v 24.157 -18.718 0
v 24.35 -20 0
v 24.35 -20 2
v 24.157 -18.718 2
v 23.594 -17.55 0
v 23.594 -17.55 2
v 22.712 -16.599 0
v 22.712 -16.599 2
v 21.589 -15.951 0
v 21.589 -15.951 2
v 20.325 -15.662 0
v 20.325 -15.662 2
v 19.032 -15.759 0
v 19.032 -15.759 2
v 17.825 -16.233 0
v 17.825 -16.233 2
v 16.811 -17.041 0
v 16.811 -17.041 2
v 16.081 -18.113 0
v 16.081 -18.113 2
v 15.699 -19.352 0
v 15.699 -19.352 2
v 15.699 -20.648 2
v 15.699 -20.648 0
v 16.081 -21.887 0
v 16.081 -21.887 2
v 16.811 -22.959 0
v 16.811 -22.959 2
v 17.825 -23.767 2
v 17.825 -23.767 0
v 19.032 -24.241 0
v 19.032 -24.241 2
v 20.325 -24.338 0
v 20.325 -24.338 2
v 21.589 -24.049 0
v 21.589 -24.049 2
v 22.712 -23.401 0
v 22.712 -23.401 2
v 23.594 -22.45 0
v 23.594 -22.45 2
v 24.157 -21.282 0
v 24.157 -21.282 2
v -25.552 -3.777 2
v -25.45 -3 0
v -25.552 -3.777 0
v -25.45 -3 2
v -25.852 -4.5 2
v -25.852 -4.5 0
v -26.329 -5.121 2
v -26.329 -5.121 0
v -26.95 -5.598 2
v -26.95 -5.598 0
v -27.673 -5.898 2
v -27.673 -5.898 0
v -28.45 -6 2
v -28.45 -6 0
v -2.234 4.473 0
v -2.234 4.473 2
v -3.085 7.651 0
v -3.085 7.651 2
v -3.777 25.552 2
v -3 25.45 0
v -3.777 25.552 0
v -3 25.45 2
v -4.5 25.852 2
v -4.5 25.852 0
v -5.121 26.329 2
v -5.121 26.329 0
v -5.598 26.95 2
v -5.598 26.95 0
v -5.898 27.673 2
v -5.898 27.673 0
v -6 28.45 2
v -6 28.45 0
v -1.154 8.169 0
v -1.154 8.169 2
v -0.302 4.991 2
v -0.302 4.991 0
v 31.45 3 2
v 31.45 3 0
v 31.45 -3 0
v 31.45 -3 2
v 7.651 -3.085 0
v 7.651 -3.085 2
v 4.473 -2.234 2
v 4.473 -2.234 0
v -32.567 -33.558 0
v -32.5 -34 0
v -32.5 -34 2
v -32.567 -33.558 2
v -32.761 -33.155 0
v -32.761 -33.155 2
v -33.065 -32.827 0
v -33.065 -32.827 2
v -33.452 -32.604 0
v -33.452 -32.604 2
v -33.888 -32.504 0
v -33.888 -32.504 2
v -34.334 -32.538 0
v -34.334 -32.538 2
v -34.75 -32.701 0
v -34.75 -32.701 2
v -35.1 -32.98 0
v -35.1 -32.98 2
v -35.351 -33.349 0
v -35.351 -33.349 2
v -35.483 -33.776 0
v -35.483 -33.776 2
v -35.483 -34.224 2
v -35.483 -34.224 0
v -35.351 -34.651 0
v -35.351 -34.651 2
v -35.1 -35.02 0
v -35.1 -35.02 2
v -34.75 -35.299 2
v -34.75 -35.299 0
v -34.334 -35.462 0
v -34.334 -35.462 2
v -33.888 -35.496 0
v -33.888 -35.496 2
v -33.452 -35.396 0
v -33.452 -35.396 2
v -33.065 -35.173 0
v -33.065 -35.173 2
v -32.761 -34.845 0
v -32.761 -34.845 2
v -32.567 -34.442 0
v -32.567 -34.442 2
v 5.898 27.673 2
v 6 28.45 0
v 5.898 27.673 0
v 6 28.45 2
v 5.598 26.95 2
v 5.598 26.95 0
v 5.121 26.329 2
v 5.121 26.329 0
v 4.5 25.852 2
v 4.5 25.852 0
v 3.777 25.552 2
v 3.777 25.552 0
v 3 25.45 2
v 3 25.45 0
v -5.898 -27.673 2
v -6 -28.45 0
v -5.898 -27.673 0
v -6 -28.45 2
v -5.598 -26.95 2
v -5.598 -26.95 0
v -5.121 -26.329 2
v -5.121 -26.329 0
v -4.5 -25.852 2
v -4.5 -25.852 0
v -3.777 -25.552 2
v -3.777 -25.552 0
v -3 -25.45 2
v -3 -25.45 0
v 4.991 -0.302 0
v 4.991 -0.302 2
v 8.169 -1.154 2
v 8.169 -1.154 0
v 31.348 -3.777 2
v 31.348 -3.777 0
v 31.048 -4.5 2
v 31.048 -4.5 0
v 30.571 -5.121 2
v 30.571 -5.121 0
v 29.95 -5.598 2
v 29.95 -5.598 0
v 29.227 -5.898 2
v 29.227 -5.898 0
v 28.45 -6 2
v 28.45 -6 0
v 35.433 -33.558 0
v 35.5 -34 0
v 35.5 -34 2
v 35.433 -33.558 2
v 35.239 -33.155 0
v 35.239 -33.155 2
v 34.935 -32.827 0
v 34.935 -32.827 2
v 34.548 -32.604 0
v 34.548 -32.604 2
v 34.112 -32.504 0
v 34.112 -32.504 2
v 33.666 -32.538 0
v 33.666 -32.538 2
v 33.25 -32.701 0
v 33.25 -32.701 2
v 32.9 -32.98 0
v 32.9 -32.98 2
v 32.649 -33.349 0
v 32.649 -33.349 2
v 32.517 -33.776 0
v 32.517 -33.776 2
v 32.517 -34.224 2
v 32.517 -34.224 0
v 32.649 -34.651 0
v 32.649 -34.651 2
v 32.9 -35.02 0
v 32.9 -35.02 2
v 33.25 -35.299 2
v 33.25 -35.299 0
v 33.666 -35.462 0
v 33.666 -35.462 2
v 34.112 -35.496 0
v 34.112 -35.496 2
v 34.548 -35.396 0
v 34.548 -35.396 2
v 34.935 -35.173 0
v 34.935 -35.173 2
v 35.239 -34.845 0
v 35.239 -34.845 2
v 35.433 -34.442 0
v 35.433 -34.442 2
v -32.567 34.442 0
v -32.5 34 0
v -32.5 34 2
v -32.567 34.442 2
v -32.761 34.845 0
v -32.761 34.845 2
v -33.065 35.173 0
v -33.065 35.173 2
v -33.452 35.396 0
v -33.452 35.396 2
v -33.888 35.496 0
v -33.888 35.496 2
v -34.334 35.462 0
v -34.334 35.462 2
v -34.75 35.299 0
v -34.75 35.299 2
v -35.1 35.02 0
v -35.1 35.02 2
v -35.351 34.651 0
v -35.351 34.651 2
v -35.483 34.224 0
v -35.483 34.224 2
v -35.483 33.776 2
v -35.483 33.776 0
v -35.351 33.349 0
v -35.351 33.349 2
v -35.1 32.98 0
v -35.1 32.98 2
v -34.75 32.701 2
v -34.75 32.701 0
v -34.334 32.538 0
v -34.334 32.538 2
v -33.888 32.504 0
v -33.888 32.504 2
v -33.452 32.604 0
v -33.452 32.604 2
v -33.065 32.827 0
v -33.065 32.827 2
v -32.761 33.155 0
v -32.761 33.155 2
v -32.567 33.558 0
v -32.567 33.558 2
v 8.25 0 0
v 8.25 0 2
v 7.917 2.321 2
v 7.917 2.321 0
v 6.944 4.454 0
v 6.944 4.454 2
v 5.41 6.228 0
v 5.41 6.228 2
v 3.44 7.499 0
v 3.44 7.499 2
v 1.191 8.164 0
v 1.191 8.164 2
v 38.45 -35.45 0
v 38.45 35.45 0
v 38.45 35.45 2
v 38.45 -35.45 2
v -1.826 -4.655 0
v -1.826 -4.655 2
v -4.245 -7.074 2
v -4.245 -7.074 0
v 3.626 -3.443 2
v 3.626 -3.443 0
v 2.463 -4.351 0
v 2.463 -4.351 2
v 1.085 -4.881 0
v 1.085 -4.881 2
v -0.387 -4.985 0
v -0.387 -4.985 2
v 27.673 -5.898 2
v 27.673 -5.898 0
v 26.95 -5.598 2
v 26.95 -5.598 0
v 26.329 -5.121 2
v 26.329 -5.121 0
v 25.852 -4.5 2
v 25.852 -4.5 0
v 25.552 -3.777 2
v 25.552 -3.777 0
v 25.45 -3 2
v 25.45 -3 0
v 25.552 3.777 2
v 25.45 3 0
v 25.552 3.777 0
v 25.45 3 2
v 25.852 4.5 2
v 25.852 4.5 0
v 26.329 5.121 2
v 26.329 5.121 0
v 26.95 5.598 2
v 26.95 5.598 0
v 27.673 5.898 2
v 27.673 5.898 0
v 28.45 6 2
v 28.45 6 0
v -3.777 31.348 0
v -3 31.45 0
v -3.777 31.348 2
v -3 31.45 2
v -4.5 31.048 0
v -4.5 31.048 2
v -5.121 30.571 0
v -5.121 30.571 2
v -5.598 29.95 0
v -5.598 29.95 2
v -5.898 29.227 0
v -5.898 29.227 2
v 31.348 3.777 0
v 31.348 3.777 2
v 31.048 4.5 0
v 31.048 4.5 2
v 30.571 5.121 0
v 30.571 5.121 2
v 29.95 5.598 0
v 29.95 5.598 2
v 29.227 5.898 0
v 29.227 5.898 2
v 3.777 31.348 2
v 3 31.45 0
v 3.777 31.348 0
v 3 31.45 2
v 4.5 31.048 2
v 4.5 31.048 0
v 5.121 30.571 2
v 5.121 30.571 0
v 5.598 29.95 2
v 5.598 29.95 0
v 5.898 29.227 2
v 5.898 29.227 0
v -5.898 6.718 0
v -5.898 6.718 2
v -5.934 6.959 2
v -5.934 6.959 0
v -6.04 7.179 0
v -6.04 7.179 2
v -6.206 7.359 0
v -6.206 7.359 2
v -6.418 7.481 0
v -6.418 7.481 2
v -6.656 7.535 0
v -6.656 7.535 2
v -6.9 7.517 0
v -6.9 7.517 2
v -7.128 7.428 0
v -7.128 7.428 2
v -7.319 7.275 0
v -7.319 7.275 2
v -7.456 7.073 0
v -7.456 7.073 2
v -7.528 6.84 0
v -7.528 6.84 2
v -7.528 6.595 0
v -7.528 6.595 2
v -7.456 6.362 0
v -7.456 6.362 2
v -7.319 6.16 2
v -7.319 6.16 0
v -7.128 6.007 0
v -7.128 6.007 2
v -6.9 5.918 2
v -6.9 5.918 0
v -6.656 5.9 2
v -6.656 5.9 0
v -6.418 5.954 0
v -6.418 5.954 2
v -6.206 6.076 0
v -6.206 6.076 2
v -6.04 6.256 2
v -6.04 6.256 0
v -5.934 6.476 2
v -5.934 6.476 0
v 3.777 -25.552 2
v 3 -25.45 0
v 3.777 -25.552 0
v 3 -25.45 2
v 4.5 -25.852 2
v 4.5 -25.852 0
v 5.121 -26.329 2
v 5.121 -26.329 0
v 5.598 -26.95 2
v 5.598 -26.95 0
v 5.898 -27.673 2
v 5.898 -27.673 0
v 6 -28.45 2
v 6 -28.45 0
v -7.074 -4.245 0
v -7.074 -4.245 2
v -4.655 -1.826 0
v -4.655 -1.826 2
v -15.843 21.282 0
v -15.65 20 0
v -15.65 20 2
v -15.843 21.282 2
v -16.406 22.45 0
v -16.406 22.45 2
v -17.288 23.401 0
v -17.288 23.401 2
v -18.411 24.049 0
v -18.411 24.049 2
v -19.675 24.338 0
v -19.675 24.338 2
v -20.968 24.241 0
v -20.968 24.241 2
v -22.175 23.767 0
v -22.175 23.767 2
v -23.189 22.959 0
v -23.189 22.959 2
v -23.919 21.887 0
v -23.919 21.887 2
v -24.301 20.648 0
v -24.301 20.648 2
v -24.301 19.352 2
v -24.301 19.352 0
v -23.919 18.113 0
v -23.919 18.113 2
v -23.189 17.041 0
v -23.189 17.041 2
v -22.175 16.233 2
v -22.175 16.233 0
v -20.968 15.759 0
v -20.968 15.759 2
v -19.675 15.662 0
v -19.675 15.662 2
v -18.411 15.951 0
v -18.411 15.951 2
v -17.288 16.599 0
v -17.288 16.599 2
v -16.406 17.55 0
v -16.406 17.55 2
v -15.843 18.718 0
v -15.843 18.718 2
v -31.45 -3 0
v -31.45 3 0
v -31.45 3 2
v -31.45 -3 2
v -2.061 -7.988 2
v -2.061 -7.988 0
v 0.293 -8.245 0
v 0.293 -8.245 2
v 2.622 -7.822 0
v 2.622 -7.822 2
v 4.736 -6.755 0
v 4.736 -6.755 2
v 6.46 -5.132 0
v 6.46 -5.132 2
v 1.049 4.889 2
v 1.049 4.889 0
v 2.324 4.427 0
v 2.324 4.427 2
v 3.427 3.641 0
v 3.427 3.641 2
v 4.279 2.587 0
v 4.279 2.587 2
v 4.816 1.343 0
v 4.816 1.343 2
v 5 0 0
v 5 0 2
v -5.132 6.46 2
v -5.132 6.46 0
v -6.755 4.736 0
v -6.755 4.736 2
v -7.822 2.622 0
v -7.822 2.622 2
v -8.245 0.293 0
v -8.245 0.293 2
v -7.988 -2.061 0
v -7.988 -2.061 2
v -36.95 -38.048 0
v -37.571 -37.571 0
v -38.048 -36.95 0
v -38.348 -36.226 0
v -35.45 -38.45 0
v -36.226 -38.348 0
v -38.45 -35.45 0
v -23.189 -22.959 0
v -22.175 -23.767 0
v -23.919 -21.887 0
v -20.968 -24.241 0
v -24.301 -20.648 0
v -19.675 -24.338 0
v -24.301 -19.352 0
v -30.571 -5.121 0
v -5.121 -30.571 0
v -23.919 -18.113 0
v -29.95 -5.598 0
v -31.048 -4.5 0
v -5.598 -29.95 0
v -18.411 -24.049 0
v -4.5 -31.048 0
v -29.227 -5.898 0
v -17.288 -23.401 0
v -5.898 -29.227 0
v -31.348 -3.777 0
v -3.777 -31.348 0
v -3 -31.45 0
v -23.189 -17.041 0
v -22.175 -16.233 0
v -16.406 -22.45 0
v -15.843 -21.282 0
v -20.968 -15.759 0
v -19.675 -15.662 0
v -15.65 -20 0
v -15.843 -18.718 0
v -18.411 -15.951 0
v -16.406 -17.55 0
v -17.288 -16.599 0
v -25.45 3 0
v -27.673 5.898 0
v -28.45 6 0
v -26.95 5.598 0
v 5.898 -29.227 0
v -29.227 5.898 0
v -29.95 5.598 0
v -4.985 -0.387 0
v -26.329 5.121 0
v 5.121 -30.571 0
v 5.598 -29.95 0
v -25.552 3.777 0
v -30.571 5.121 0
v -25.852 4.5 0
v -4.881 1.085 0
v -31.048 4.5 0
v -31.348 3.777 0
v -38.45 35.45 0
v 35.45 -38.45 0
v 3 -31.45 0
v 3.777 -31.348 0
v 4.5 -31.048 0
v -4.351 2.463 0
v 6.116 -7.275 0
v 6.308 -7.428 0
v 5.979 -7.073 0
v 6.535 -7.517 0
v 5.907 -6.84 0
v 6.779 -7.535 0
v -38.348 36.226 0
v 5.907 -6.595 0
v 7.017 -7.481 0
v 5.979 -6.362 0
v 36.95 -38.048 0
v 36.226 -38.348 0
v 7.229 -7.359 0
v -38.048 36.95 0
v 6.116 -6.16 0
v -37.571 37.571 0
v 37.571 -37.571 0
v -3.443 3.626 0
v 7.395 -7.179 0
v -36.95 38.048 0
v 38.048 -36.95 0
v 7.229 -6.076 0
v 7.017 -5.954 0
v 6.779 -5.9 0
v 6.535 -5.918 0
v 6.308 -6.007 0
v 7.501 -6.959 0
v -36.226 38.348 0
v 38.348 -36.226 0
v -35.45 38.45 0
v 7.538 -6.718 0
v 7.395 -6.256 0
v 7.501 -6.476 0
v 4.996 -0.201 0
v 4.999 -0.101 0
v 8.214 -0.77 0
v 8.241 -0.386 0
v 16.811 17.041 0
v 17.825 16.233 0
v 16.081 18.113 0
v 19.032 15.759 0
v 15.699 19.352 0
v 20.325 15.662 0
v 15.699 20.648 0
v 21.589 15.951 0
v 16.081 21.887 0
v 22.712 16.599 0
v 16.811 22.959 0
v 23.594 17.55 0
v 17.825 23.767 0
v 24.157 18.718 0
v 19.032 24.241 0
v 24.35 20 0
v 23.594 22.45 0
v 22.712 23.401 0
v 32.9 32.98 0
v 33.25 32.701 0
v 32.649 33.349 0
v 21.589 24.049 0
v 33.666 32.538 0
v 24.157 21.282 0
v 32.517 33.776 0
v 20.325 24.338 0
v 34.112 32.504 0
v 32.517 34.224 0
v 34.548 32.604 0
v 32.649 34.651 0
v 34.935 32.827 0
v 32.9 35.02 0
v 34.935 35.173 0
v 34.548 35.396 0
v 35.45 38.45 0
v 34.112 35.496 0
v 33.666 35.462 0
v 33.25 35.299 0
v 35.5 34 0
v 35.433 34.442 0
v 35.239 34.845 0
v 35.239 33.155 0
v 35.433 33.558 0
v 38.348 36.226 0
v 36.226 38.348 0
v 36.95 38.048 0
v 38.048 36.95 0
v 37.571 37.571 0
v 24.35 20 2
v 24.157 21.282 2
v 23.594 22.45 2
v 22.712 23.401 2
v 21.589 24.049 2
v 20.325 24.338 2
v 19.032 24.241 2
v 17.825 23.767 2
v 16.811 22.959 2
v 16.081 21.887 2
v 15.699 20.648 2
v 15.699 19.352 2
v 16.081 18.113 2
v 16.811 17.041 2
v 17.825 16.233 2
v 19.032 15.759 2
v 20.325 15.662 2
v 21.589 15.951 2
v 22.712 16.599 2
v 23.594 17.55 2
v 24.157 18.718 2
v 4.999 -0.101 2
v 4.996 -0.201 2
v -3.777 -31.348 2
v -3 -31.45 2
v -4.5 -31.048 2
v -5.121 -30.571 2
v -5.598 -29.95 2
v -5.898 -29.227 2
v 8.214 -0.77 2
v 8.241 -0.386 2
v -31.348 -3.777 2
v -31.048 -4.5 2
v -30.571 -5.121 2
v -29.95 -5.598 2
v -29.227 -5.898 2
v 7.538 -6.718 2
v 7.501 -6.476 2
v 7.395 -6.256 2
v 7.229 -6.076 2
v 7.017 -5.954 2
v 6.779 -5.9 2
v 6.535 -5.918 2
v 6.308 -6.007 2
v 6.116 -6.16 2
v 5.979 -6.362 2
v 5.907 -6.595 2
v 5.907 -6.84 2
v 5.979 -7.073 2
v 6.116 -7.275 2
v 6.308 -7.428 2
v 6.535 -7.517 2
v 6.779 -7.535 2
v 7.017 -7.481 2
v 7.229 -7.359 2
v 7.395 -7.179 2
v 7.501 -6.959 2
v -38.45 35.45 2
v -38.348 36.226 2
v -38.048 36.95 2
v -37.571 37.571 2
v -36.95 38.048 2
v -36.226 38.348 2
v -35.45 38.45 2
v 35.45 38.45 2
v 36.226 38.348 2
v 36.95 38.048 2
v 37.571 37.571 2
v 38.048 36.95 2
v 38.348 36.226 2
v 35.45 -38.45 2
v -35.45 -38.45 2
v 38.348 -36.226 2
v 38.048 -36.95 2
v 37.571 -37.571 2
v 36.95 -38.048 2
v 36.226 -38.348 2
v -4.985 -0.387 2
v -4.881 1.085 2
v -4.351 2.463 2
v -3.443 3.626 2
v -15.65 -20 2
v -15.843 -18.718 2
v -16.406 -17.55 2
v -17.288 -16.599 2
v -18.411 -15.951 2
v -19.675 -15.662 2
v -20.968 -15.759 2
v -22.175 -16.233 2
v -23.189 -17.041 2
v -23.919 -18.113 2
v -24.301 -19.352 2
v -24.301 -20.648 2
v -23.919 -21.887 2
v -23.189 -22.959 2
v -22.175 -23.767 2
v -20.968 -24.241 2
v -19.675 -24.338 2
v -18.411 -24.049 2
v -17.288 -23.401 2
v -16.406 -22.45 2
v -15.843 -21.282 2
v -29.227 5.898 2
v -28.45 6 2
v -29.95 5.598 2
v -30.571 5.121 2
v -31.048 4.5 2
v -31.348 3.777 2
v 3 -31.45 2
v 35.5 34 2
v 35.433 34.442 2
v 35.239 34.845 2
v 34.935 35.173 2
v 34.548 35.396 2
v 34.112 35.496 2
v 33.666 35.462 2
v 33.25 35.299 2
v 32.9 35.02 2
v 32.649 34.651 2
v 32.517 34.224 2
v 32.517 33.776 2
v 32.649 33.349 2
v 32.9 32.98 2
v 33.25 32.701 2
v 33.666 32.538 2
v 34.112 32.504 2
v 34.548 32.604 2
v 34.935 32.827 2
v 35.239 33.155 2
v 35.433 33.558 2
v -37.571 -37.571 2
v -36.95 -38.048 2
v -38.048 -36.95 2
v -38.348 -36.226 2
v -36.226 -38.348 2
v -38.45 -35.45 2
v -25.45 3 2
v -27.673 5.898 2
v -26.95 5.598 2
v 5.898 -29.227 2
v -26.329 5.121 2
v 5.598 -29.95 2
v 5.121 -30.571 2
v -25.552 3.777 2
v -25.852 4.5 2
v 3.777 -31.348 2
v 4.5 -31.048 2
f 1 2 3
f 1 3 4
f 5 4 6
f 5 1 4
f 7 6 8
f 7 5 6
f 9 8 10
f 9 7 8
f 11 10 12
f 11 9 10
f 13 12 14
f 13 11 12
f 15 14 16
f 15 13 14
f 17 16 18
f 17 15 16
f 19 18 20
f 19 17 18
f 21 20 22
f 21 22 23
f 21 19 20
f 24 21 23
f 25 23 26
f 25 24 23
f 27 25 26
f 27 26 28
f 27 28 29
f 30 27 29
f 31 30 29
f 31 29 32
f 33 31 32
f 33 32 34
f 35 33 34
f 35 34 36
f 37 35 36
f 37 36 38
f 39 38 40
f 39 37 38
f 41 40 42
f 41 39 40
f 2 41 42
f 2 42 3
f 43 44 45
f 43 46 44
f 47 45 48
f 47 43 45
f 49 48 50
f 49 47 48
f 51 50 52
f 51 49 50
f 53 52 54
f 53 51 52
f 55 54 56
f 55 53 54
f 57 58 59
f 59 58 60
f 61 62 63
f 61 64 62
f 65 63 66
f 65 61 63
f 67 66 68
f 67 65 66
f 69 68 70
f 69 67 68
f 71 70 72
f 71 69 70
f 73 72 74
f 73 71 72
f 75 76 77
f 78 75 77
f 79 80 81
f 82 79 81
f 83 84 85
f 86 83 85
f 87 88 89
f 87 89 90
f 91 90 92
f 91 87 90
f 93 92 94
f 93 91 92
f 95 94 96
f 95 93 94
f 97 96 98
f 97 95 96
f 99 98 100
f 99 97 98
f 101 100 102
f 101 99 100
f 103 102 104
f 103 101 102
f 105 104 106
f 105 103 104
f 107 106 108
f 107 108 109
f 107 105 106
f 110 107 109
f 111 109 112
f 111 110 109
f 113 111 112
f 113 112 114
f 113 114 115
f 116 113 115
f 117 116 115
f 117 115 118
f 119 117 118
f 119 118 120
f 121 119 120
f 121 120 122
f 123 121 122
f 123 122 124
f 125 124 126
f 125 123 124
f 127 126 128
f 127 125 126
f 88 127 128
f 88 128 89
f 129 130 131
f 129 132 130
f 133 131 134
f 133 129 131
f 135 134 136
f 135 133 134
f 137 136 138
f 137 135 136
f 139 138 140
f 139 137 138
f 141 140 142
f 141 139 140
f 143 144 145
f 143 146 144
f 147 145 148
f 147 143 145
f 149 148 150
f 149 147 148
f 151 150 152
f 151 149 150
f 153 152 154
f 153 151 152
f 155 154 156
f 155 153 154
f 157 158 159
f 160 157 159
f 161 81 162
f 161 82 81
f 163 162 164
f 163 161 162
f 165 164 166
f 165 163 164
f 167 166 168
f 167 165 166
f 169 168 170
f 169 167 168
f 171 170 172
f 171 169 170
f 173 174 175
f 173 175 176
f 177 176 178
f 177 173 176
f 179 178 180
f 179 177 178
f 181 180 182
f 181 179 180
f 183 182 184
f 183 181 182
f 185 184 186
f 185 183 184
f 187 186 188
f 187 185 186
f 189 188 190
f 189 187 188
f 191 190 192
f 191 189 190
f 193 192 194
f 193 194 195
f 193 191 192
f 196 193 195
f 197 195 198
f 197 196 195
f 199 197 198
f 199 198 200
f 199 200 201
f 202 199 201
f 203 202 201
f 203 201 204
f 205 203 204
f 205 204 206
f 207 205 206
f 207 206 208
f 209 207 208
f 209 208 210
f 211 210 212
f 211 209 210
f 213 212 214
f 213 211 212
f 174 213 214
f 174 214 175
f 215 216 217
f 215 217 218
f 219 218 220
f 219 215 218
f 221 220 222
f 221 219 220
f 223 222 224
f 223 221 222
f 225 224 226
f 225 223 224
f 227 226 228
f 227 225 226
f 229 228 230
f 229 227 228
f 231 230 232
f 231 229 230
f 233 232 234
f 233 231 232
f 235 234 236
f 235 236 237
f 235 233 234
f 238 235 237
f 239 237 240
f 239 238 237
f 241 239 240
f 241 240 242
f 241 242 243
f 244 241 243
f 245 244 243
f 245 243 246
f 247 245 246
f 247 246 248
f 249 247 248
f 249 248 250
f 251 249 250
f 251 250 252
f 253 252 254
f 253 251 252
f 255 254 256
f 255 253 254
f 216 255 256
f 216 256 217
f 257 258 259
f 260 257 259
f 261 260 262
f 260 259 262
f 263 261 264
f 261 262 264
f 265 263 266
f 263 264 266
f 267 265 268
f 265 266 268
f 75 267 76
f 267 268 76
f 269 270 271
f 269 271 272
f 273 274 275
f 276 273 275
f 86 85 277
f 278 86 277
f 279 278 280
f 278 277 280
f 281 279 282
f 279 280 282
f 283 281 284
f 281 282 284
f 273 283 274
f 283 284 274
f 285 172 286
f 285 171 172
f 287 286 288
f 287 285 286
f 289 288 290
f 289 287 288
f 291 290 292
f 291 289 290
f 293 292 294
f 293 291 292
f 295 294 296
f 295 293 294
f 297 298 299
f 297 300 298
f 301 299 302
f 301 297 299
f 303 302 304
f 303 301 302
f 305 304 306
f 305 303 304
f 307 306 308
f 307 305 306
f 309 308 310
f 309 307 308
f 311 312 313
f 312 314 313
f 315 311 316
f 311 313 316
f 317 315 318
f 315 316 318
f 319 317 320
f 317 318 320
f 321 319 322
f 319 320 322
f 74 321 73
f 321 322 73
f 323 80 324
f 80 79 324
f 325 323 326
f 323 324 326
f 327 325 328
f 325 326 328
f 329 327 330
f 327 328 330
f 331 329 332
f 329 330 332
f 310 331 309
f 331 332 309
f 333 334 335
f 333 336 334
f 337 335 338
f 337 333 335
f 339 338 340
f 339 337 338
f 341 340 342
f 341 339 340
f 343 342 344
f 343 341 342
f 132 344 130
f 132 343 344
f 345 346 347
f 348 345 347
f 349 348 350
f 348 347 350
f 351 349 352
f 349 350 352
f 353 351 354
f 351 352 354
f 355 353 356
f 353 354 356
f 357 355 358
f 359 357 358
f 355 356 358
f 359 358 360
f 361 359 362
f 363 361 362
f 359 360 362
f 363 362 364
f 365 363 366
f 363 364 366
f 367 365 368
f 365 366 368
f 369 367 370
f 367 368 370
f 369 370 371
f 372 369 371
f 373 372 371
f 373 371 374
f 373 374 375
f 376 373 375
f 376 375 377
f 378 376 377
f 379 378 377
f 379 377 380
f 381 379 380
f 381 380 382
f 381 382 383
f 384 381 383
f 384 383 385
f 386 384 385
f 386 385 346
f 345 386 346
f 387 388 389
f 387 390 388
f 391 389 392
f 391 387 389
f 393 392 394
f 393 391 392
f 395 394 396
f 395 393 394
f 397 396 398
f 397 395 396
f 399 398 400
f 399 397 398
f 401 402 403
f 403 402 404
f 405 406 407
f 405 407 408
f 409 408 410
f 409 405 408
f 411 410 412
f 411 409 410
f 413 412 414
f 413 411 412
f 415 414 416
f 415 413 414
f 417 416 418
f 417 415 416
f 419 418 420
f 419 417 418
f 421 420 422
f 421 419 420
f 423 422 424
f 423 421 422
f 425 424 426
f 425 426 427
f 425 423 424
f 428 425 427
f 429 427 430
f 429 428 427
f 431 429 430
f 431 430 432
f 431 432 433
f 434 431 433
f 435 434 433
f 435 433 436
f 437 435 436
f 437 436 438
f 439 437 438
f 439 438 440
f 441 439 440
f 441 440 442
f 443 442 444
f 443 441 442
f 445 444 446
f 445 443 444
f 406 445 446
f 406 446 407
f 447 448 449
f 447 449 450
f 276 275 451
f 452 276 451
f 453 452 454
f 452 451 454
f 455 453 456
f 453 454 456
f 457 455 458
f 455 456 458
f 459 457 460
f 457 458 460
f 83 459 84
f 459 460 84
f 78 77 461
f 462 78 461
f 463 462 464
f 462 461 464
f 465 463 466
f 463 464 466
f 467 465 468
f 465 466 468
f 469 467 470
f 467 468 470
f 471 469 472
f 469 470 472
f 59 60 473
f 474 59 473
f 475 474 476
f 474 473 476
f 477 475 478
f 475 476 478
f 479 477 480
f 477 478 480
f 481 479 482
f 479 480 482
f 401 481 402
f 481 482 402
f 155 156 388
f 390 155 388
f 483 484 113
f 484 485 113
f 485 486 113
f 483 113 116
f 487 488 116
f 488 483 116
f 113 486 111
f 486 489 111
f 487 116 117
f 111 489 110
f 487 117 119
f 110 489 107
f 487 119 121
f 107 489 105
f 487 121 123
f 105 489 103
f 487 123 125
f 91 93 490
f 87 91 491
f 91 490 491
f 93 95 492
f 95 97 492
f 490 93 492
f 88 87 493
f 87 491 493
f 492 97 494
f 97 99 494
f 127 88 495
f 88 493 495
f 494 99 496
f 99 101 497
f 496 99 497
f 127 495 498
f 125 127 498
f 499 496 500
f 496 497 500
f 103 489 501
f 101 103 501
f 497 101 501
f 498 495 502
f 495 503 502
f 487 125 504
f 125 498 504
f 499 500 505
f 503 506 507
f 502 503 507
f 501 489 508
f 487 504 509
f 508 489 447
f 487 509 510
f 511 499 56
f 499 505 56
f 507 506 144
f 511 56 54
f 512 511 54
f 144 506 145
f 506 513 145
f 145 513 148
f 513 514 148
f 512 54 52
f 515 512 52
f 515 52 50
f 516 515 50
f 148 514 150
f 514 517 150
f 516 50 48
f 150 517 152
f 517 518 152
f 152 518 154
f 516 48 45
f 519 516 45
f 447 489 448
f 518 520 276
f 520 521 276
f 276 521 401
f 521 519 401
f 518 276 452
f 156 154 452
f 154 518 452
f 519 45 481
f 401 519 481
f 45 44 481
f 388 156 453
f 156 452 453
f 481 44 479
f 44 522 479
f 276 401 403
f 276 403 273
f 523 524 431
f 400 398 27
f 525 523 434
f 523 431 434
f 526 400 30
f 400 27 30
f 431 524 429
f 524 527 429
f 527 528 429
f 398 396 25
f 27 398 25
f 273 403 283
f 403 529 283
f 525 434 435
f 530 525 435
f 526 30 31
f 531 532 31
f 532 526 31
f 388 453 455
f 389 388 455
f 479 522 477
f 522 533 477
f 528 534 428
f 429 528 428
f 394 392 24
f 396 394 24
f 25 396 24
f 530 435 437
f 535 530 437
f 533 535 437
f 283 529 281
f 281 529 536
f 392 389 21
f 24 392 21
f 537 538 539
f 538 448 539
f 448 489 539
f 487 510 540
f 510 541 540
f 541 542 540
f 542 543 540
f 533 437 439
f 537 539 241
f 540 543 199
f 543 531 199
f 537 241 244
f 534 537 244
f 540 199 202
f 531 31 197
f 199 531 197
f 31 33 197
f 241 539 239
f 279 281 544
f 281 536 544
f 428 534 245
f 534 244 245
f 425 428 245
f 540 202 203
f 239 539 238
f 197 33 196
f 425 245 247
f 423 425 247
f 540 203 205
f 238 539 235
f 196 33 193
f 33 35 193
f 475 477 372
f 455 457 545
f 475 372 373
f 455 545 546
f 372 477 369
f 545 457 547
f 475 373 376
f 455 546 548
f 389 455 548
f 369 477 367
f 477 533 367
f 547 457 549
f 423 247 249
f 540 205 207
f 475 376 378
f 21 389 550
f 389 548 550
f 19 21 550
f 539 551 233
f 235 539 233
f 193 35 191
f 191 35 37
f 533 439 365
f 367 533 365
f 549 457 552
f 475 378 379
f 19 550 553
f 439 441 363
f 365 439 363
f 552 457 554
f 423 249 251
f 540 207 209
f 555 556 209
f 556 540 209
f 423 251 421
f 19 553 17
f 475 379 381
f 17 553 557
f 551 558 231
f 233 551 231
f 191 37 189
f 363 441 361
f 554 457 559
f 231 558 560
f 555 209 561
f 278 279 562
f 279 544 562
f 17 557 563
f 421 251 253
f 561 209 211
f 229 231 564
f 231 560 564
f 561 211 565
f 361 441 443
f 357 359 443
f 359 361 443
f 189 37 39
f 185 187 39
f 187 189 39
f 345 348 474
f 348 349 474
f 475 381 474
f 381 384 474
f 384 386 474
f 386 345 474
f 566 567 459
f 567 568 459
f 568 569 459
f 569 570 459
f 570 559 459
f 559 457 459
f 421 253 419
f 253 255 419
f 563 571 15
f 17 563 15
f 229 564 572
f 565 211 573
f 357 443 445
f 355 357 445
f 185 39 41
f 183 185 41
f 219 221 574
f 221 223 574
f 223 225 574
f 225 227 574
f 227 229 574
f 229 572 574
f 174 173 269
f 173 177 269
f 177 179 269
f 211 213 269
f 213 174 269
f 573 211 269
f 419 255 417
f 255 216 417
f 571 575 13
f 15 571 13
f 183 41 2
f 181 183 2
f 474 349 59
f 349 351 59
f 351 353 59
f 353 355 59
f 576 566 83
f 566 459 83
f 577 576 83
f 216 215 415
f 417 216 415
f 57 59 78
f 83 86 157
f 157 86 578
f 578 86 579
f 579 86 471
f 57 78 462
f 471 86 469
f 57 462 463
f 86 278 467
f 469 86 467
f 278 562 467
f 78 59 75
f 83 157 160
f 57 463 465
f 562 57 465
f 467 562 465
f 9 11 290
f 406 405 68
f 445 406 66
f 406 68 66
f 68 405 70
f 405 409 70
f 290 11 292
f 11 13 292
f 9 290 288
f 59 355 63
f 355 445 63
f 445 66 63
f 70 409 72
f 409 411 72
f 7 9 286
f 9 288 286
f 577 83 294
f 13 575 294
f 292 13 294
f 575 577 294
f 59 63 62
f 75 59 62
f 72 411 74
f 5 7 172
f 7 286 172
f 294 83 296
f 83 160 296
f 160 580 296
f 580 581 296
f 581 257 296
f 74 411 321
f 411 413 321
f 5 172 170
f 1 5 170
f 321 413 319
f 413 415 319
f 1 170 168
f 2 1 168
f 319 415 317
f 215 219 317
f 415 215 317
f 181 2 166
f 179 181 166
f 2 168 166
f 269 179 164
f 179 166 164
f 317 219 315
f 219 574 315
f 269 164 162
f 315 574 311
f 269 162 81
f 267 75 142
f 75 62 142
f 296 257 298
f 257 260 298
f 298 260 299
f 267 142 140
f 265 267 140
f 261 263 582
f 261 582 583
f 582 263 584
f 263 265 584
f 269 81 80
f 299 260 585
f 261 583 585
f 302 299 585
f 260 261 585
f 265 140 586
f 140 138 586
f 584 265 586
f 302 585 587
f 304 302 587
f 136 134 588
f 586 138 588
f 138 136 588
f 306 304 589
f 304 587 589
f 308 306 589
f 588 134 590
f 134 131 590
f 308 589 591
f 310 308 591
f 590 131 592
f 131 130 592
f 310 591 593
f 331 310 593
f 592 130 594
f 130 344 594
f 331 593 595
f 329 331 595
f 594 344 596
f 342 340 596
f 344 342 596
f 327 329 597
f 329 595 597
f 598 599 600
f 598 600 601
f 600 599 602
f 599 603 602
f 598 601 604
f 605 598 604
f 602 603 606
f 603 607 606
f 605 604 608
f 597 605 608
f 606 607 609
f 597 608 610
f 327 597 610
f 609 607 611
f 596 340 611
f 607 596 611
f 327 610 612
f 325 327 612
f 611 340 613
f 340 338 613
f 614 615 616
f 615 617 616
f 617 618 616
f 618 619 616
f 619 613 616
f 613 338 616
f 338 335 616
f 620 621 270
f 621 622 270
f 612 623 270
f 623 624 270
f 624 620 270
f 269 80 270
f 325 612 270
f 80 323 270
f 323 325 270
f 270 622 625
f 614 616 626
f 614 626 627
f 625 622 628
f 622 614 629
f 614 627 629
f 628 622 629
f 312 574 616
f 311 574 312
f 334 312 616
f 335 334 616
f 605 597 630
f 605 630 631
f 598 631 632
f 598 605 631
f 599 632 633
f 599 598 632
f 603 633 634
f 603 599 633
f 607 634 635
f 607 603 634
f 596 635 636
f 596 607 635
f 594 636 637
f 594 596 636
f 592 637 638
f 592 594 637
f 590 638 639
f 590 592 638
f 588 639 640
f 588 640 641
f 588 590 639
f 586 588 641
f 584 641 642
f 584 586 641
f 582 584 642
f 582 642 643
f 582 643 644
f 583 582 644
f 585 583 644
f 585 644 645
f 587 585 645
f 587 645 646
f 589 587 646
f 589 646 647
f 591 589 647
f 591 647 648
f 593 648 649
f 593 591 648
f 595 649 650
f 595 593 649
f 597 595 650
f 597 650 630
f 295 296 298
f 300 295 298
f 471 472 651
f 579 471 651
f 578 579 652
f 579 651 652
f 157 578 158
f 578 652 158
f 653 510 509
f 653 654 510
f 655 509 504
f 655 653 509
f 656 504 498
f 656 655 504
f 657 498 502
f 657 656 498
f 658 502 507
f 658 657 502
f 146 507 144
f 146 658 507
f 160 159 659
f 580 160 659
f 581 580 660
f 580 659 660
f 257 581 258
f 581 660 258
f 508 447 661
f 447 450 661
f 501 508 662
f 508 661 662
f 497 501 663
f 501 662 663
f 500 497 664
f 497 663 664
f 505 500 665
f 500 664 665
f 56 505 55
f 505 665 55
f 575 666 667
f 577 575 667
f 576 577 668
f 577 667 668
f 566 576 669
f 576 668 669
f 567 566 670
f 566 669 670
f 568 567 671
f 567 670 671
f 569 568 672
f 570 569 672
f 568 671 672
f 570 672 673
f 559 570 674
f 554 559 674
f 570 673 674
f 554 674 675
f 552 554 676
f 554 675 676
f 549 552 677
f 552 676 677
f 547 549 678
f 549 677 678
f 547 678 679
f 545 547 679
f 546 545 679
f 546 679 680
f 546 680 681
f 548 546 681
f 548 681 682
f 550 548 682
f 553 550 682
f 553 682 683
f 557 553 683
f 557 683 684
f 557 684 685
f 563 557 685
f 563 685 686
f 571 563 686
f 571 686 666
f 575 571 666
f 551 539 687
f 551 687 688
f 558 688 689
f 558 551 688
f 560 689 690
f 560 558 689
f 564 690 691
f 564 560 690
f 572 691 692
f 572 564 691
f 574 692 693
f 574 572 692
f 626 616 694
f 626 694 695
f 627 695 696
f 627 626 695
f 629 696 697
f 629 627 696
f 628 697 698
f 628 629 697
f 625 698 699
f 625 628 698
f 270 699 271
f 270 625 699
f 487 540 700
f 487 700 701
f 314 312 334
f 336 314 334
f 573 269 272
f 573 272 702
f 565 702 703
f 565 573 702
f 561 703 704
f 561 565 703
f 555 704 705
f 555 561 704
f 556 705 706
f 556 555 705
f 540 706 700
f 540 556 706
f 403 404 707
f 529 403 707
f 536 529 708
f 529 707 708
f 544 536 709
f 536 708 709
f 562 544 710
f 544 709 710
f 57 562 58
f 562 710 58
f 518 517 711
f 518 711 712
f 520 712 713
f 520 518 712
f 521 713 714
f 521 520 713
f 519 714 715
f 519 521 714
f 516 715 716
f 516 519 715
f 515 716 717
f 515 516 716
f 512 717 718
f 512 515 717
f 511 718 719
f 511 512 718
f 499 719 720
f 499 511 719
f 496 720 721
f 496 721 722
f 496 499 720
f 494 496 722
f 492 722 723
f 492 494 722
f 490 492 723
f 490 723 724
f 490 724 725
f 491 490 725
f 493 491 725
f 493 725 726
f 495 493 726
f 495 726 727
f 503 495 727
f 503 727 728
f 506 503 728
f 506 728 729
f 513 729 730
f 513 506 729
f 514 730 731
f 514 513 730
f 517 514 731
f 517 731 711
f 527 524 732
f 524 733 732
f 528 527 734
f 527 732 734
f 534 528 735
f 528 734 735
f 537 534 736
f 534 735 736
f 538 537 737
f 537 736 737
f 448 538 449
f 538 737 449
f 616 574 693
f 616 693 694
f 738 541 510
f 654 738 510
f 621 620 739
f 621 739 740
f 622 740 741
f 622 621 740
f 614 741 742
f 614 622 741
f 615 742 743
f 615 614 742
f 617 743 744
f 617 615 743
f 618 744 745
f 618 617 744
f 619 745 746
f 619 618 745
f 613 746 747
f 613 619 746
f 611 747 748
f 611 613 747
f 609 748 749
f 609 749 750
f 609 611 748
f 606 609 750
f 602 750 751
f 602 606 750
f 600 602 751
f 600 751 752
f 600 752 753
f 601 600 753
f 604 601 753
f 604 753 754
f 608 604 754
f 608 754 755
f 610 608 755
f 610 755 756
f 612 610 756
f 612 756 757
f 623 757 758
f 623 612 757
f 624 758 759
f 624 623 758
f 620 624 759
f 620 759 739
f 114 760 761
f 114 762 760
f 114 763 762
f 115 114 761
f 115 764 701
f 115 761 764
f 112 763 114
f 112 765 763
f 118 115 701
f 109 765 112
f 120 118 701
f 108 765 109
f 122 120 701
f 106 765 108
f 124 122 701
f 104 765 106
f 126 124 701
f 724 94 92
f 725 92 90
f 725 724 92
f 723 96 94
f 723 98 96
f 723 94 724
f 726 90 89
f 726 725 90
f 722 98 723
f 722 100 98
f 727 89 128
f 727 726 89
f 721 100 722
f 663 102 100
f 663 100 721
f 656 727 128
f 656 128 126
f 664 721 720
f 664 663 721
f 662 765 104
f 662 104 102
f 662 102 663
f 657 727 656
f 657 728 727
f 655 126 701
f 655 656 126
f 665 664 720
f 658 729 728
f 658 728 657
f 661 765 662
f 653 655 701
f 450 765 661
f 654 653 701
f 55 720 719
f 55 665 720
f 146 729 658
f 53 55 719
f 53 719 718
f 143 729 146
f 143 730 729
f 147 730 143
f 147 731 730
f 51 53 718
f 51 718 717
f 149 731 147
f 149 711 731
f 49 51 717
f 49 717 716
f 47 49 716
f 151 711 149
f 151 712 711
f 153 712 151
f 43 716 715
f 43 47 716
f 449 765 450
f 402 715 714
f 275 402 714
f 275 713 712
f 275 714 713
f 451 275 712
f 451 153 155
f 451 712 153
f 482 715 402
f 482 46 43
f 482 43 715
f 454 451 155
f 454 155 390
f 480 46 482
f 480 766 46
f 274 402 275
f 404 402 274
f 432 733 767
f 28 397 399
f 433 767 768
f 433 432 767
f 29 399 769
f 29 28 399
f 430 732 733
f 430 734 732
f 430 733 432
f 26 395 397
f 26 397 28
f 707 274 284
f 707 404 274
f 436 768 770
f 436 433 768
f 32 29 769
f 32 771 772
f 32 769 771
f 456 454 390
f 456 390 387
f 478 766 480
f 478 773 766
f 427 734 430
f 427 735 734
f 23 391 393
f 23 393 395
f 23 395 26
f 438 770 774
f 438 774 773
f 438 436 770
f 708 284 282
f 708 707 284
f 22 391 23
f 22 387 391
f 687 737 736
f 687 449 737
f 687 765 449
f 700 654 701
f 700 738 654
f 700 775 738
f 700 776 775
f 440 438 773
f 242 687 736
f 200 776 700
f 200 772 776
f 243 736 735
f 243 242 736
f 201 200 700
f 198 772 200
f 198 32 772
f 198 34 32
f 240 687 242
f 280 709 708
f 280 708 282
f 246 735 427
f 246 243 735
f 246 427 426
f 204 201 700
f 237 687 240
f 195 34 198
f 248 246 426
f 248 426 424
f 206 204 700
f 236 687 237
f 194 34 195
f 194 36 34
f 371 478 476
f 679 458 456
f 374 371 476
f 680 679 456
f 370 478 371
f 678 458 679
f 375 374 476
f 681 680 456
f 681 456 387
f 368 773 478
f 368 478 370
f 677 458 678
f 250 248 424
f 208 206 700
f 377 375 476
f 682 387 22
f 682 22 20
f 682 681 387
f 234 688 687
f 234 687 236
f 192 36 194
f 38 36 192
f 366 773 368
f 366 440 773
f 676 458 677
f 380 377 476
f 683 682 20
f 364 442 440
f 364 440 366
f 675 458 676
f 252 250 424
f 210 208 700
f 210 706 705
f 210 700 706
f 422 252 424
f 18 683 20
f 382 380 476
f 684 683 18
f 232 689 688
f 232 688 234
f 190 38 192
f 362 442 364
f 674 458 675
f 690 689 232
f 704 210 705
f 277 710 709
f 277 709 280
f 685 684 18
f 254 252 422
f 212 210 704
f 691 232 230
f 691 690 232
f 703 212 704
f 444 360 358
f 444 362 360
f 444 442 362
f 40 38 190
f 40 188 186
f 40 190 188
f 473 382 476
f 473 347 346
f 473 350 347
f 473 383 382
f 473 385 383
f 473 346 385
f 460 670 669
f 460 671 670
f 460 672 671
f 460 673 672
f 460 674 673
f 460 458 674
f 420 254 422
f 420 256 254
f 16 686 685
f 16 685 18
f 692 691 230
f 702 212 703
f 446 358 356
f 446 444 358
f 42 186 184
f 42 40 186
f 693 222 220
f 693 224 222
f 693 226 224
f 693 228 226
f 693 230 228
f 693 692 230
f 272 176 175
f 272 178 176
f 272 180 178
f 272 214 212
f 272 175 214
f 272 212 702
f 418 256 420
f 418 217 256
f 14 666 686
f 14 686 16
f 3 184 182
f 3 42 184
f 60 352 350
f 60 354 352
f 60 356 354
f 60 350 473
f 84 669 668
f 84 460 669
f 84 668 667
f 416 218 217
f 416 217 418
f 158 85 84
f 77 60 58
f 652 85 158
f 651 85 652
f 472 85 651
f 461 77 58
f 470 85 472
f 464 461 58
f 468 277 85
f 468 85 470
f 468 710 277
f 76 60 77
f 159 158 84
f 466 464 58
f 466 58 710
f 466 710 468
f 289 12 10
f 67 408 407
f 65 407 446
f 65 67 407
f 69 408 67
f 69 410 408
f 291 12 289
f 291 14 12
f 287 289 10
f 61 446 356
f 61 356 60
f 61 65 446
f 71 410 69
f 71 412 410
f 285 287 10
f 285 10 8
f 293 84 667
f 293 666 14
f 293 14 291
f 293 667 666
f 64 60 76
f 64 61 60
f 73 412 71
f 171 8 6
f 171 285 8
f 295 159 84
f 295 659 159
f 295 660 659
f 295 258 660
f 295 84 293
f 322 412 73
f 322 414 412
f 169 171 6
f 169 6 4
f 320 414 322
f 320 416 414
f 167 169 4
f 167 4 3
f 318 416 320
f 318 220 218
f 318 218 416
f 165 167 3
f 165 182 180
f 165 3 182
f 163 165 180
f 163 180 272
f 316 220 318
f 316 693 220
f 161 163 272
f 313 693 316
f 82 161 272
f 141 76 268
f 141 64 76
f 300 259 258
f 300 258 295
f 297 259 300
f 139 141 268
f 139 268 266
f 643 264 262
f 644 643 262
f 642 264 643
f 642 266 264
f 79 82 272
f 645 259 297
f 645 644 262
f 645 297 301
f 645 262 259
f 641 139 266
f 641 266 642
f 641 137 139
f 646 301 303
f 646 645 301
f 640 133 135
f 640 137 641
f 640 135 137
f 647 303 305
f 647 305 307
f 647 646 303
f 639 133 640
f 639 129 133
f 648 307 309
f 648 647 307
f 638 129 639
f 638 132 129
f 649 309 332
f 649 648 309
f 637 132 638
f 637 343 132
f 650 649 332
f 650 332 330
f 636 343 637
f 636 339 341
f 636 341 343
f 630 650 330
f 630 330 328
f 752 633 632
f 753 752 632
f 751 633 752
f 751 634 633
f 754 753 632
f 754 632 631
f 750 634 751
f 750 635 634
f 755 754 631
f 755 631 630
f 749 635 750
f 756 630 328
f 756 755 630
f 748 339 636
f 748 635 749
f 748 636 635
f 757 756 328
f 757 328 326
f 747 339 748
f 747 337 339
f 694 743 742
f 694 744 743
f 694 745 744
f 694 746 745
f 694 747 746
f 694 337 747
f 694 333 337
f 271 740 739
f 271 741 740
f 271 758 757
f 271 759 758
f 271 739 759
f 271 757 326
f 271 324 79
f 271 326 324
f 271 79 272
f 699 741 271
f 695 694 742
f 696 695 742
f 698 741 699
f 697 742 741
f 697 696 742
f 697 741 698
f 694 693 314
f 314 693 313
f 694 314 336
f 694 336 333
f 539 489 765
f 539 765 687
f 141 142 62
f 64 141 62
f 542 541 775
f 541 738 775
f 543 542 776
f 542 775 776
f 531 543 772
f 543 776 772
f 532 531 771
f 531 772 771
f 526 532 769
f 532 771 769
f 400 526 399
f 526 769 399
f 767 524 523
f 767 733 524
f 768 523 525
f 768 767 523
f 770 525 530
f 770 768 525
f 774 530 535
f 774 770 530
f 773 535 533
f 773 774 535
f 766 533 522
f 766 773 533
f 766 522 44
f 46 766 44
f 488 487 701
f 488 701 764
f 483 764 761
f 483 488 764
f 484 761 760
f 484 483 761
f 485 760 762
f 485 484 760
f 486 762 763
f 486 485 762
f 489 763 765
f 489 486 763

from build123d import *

# Parameters (mm, degrees)
SKETCH_1_R          = 1.5
SKETCH_1_R_2        = 4.35
EXTRUDE_1_DEPTH     = 2
SKETCH_3_R          = 0.82
CUT_EXTRUDE_2_DEPTH = 10
EXTRUDE_START       = -2
EXTRUDE_2_DEPTH     = 2
FILLET_1_R          = 3


with BuildPart() as part:
    # 草圖1 → 填料-伸長1 (new body)
    with BuildSketch(Plane.XY):
        with BuildLine():
            Line((-35.45, 38.45), (35.45, 38.45))
            ThreePointArc((35.45, 38.45), (37.571320344, 37.571320344), (38.45, 35.45))
            Line((38.45, 35.45), (38.45, -35.45))
            ThreePointArc((38.45, -35.45), (37.571320344, -37.571320344), (35.45, -38.45))
            Line((35.45, -38.45), (-35.45, -38.45))
            ThreePointArc((-35.45, -38.45), (-37.571320344, -37.571320344), (-38.45, -35.45))
            Line((-38.45, -35.45), (-38.45, 35.45))
            ThreePointArc((-38.45, 35.45), (-37.571320344, 37.571320344), (-35.45, 38.45))
        make_face()
        with Locations((-34, 34)):
            Circle(SKETCH_1_R, mode=Mode.SUBTRACT)
        with Locations((34, 34)):
            Circle(SKETCH_1_R, mode=Mode.SUBTRACT)
        with Locations((34, -34)):
            Circle(SKETCH_1_R, mode=Mode.SUBTRACT)
        with Locations((-34, -34)):
            Circle(SKETCH_1_R, mode=Mode.SUBTRACT)
        with Locations((-20, 20)):
            Circle(SKETCH_1_R_2, mode=Mode.SUBTRACT)
        with Locations((20, 20)):
            Circle(SKETCH_1_R_2, mode=Mode.SUBTRACT)
        with Locations((-20, -20)):
            Circle(SKETCH_1_R_2, mode=Mode.SUBTRACT)
        with Locations((20, -20)):
            Circle(SKETCH_1_R_2, mode=Mode.SUBTRACT)
        with BuildLine():
            Line((-18.5, 31.45), (18.5, 31.45))
            Line((18.5, 31.45), (18.5, 26.837397166))
            ThreePointArc((18.5, 26.837397166), (15.050252532, 24.949747468), (13.162602834, 21.5))
            Line((13.162602834, 21.5), (-13.162602834, 21.5))
            ThreePointArc((-13.162602834, 21.5), (-15.050252532, 24.949747468), (-18.5, 26.837397166))
            Line((-18.5, 26.837397166), (-18.5, 31.45))
        make_face(mode=Mode.SUBTRACT)
        with BuildLine():
            Line((-31.45, 18.5), (-31.45, -18.5))
            Line((-31.45, -18.5), (-26.837397166, -18.5))
            ThreePointArc((-26.837397166, -18.5), (-24.949747468, -15.050252532), (-21.5, -13.162602834))
            Line((-21.5, -13.162602834), (-21.5, 13.162602834))
            ThreePointArc((-21.5, 13.162602834), (-24.949747468, 15.050252532), (-26.837397166, 18.5))
            Line((-26.837397166, 18.5), (-31.45, 18.5))
        make_face(mode=Mode.SUBTRACT)
        with BuildLine():
            Line((26.837397166, 18.5), (31.45, 18.5))
            Line((31.45, 18.5), (31.45, -18.5))
            Line((31.45, -18.5), (26.837397166, -18.5))
            ThreePointArc((26.837397166, -18.5), (24.949747468, -15.050252532), (21.5, -13.162602834))
            Line((21.5, -13.162602834), (21.5, 13.162602834))
            ThreePointArc((21.5, 13.162602834), (24.949747468, 15.050252532), (26.837397166, 18.5))
        make_face(mode=Mode.SUBTRACT)
        with BuildLine():
            Line((-18.5, -31.45), (-18.5, -26.837397166))
            ThreePointArc((-18.5, -26.837397166), (-15.050252532, -24.949747468), (-13.162602834, -21.5))
            Line((-13.162602834, -21.5), (13.162602834, -21.5))
            ThreePointArc((13.162602834, -21.5), (15.050252532, -24.949747468), (18.5, -26.837397166))
            Line((18.5, -26.837397166), (18.5, -31.45))
            Line((18.5, -31.45), (-18.5, -31.45))
        make_face(mode=Mode.SUBTRACT)
    extrude(amount=EXTRUDE_1_DEPTH)

    # 草圖3 → 除料-伸長2 (cut)
    with BuildSketch(Plane.XY.offset(2)):
        with BuildLine():
            Line((-7.073829274, -4.245402149), (-4.654583912, -1.826156787))
            ThreePointArc((-4.654583912, -1.826156787), (-4.667257292, 1.793518711), (-2.233875019, 4.473231762))
            Line((-2.233875019, 4.473231762), (-3.085438902, 7.651311442))
            ThreePointArc((-3.085438902, 7.651311442), (-7.822124458, 2.622378494), (-7.073829274, -4.245402149))
        make_face()
        with BuildLine():
            Line((-1.15358725, 8.168949532), (-0.302023366, 4.990869853))
            ThreePointArc((-0.302023366, 4.990869853), (3.427089375, 3.640749705), (5, 0))
            ThreePointArc((5, 0), (4.997716942, -0.151080668), (4.990869853, -0.302023366))
            Line((4.990869853, -0.302023366), (8.168949532, -1.15358725))
            ThreePointArc((8.168949532, -1.15358725), (8.229712438, -0.578215514), (8.25, 0))
            ThreePointArc((8.25, 0), (5.410425362, 6.228145583), (-1.15358725, 8.168949532))
        make_face()
        with BuildLine():
            ThreePointArc((4.473231762, -2.233875019), (1.793518711, -4.667257292), (-1.826156787, -4.654583912))
            Line((-1.826156787, -4.654583912), (-4.245402149, -7.073829274))
            ThreePointArc((-4.245402149, -7.073829274), (2.622378494, -7.822124458), (7.651311442, -3.085438902))
            Line((7.651311442, -3.085438902), (4.473231762, -2.233875019))
        make_face()
        with Locations((6.717514421, -6.717514421)):
            Circle(SKETCH_3_R)
        with Locations((-6.717514421, 6.717514421)):
            Circle(SKETCH_3_R)
    extrude(amount=-CUT_EXTRUDE_2_DEPTH, mode=Mode.SUBTRACT)

    # 草圖4 → 填料-伸長2 (add)
    with BuildSketch(Plane.XY.offset(2).offset(EXTRUDE_START)):
        with BuildLine():
            Line((-31.45, -6), (-31.45, -18.5))
            Line((-31.45, -18.5), (-26.837397166, -18.5))
            ThreePointArc((-26.837397166, -18.5), (-24.949747468, -15.050252532), (-21.5, -13.162602834))
            Line((-21.5, -13.162602834), (-21.5, 13.162602834))
            ThreePointArc((-21.5, 13.162602834), (-24.949747468, 15.050252532), (-26.837397166, 18.5))
            Line((-26.837397166, 18.5), (-31.45, 18.5))
            Line((-31.45, 18.5), (-31.45, 6))
            Line((-31.45, 6), (-25.45, 6))
            Line((-25.45, 6), (-25.45, -6))
            Line((-25.45, -6), (-31.45, -6))
        make_face()
        with BuildLine():
            Line((-6, 31.45), (-18.5, 31.45))
            Line((-18.5, 31.45), (-18.5, 26.837397166))
            ThreePointArc((-18.5, 26.837397166), (-15.050252532, 24.949747468), (-13.162602834, 21.5))
            Line((-13.162602834, 21.5), (13.162602834, 21.5))
            ThreePointArc((13.162602834, 21.5), (15.050252532, 24.949747468), (18.5, 26.837397166))
            Line((18.5, 26.837397166), (18.5, 31.45))
            Line((18.5, 31.45), (6, 31.45))
            Line((6, 31.45), (6, 25.45))
            Line((6, 25.45), (-6, 25.45))
            Line((-6, 25.45), (-6, 31.45))
        make_face()
        with BuildLine():
            Line((31.45, 6), (31.45, 18.5))
            Line((31.45, 18.5), (26.837397166, 18.5))
            ThreePointArc((26.837397166, 18.5), (24.949747468, 15.050252532), (21.5, 13.162602834))
            Line((21.5, 13.162602834), (21.5, -13.162602834))
            ThreePointArc((21.5, -13.162602834), (24.949747468, -15.050252532), (26.837397166, -18.5))
            Line((26.837397166, -18.5), (31.45, -18.5))
            Line((31.45, -18.5), (31.45, -6))
            Line((31.45, -6), (25.45, -6))
            Line((25.45, -6), (25.45, 6))
            Line((25.45, 6), (31.45, 6))
        make_face()
        with BuildLine():
            Line((6, -31.45), (18.5, -31.45))
            Line((18.5, -31.45), (18.5, -26.837397166))
            ThreePointArc((18.5, -26.837397166), (15.050252532, -24.949747468), (13.162602834, -21.5))
            Line((13.162602834, -21.5), (-13.162602834, -21.5))
            ThreePointArc((-13.162602834, -21.5), (-15.050252532, -24.949747468), (-18.5, -26.837397166))
            Line((-18.5, -26.837397166), (-18.5, -31.45))
            Line((-18.5, -31.45), (-6, -31.45))
            Line((-6, -31.45), (-6, -25.45))
            Line((-6, -25.45), (6, -25.45))
            Line((6, -25.45), (6, -31.45))
        make_face()
    extrude(amount=EXTRUDE_2_DEPTH)

    # 圓角1
    fillet_1_edges = [part.edges().sort_by_distance(p)[0] for p in [
        (-25.45, -6, 1),
        (-31.45, -6, 1),
        (-25.45, 6, 1),
        (-31.45, 6, 1),
        (6, 31.45, 1),
        (6, 25.45, 1),
        (-6, 31.45, 1),
        (-6, 25.45, 1),
        (31.45, 6, 1),
        (25.45, 6, 1),
        (31.45, -6, 1),
        (25.45, -6, 1),
        (-6, -31.45, 1),
        (-6, -25.45, 1),
        (6, -31.45, 1),
        (6, -25.45, 1),
    ]]
    fillet(fillet_1_edges, radius=FILLET_1_R - 0.0001)  # a hair under: the kernel refuses the full size


solid = part.part
